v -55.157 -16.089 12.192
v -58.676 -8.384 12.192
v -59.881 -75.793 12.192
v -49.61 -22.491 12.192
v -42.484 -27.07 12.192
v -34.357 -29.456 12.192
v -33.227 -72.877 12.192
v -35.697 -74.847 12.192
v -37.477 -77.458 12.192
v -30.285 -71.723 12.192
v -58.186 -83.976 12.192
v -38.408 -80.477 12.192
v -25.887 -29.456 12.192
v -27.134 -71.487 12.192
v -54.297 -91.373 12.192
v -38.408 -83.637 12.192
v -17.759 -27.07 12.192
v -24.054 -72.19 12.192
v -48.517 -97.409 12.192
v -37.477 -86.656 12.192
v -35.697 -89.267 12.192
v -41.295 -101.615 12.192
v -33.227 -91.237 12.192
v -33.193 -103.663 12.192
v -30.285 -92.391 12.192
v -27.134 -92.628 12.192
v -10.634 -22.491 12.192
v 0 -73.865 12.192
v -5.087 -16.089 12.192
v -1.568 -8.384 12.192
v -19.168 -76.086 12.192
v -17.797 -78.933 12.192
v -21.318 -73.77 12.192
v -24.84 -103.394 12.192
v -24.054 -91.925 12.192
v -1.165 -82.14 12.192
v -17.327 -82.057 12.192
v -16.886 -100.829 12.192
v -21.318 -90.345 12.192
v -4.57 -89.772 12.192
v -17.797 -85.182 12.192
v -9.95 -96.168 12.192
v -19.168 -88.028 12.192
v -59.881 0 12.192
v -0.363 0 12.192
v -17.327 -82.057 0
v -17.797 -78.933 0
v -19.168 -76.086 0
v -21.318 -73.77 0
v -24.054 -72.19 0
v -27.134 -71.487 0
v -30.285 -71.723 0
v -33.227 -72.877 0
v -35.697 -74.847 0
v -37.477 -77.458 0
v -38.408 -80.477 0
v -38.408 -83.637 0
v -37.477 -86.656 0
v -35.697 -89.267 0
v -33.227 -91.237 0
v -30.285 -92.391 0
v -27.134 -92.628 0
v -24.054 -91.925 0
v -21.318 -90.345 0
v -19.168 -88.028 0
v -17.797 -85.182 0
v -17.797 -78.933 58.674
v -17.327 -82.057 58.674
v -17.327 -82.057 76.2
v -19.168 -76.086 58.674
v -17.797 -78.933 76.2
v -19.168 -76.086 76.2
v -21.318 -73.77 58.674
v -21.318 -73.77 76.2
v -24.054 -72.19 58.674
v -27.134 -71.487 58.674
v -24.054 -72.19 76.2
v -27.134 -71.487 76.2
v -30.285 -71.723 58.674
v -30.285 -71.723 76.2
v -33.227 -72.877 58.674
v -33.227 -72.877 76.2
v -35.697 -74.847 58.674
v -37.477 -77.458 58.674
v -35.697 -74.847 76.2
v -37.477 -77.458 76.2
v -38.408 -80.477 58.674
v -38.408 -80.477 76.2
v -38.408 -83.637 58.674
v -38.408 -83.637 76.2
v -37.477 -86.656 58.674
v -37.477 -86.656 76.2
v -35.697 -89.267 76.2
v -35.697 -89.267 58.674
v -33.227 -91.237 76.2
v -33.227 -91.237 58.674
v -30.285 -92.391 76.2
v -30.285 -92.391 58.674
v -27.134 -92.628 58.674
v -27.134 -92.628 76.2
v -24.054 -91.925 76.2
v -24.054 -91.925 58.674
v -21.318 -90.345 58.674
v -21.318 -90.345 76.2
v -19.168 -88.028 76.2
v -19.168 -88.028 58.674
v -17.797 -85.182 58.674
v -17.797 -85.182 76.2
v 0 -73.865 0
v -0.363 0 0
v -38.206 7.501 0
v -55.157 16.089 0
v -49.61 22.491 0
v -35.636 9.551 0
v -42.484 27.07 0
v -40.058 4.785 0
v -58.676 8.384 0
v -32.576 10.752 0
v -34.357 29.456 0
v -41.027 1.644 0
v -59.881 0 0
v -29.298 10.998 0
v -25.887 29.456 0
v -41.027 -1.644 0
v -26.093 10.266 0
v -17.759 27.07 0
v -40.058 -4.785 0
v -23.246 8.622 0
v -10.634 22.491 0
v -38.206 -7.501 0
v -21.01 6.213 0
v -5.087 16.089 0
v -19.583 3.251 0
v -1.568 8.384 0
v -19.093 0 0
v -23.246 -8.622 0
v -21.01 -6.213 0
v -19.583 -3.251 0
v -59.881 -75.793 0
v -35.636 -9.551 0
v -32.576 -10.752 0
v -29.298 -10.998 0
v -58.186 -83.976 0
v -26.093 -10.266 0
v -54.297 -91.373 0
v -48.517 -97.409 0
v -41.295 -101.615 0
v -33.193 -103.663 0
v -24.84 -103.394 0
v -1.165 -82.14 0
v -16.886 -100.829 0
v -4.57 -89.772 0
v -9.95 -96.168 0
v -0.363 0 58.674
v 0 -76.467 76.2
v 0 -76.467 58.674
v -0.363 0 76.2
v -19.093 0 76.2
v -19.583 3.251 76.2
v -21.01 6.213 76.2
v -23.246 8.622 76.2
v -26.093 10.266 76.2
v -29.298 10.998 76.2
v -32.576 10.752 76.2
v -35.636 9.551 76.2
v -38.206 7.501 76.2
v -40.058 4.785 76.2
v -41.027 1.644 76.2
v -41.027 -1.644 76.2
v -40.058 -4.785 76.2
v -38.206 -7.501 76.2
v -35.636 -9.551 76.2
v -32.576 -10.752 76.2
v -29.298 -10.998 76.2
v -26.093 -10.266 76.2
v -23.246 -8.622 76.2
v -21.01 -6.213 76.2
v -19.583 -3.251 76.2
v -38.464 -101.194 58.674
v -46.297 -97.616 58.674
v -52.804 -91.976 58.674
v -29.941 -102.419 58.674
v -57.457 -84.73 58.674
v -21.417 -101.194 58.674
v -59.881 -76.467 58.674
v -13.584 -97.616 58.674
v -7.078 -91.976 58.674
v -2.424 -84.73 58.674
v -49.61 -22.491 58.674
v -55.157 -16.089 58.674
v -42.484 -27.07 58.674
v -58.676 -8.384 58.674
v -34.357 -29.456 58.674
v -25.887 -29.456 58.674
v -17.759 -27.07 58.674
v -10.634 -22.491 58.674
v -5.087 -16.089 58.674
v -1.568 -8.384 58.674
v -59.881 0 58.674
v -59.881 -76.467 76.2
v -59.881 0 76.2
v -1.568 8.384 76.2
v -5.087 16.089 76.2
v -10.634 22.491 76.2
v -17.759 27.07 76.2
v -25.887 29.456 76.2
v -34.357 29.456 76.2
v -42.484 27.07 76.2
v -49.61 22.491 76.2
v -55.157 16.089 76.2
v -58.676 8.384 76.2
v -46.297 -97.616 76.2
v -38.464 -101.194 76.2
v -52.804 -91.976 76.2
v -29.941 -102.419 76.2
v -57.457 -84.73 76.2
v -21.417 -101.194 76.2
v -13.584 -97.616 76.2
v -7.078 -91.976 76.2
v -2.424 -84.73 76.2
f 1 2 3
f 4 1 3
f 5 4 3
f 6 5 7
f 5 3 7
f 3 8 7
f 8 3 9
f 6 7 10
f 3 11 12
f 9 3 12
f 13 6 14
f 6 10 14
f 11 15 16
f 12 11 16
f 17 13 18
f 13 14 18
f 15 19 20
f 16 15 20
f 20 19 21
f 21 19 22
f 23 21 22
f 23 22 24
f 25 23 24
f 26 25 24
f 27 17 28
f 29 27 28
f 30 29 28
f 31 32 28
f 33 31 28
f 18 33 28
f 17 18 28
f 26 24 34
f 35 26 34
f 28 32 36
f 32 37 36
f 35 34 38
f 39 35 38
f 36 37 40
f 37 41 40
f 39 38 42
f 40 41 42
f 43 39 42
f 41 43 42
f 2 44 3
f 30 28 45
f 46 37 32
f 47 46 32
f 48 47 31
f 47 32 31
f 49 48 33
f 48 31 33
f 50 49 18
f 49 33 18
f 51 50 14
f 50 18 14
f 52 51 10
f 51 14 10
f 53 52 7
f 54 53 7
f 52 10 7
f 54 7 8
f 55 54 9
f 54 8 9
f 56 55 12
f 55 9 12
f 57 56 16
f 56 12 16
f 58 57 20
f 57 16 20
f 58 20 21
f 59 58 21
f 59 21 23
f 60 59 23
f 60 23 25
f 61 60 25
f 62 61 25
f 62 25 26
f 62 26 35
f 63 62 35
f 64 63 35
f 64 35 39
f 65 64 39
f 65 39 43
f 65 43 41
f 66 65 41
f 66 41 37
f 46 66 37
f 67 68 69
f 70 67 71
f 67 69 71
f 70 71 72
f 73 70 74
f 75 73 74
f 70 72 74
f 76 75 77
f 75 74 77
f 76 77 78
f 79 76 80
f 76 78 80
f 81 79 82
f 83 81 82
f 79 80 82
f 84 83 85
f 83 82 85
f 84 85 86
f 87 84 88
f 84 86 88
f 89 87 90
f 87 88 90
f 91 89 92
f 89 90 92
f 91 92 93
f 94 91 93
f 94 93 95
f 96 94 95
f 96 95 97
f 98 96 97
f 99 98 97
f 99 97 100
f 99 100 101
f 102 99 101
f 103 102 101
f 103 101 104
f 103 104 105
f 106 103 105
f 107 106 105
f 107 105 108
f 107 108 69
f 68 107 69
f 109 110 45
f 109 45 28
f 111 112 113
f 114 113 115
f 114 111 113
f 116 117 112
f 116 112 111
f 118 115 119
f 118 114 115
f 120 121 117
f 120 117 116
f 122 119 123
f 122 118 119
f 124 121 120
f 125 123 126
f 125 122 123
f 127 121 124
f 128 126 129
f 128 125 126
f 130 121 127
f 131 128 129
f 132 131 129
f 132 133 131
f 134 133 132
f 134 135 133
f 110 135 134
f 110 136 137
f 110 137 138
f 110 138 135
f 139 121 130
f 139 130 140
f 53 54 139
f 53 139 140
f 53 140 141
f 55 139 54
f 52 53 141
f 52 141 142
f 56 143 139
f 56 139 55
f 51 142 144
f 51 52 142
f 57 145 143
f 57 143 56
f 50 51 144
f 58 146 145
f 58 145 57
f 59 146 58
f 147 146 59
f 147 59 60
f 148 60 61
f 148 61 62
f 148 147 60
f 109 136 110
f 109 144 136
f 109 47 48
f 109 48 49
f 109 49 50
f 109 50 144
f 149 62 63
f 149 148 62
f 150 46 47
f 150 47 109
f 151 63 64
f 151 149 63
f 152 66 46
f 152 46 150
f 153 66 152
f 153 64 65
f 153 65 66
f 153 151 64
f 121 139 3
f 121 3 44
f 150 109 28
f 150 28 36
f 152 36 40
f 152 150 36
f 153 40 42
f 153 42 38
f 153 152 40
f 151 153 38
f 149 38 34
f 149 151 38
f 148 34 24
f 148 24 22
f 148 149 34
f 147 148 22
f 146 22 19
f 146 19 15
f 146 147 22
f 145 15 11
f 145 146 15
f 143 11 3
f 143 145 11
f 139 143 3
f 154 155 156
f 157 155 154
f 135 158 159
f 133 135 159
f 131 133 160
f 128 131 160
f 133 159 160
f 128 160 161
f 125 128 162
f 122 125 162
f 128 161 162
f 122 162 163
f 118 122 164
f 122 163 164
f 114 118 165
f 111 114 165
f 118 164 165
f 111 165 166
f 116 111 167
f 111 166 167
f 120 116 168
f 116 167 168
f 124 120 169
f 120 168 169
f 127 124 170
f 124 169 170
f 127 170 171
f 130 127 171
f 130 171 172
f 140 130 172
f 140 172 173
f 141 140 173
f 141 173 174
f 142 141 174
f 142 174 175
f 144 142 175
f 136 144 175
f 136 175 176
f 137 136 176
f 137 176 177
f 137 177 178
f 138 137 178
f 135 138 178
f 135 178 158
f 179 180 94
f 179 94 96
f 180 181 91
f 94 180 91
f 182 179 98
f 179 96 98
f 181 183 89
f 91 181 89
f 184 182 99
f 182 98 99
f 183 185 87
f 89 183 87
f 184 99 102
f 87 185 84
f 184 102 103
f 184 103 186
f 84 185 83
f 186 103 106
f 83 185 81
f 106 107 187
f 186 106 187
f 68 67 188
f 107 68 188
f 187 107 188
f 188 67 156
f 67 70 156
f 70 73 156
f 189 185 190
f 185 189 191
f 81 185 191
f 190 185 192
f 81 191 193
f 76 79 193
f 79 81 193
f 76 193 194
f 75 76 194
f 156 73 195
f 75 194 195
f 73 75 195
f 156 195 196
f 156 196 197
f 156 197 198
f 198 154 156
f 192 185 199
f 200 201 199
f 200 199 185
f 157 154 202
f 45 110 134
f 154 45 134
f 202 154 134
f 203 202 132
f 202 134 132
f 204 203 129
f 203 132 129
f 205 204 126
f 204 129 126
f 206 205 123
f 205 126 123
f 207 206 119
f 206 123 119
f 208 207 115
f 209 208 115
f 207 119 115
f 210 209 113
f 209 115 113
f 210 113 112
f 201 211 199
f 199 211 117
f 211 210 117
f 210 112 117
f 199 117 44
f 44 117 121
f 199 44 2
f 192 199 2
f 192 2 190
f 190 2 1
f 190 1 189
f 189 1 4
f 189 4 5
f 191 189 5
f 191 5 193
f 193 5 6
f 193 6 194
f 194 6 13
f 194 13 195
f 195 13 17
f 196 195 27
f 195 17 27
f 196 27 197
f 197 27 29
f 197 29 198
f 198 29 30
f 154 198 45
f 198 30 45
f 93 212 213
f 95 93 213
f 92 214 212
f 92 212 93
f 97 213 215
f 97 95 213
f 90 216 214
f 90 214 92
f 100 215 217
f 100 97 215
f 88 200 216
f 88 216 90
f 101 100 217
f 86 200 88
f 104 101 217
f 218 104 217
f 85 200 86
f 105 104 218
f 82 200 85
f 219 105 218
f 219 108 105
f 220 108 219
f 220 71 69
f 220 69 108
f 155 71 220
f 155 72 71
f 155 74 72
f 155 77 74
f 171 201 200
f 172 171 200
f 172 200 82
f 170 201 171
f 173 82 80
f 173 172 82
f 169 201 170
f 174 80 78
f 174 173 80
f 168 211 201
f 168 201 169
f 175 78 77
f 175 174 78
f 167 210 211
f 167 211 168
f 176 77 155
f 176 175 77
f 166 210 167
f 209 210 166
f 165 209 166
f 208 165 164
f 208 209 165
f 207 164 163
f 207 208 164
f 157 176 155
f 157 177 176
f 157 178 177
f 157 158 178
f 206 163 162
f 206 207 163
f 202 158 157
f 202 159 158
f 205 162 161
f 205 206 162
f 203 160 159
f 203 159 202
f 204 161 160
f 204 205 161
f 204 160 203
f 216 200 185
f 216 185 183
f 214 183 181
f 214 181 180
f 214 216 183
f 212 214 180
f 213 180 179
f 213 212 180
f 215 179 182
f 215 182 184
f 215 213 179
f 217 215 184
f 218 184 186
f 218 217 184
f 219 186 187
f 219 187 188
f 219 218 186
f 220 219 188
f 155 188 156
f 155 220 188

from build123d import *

# Parameters (mm, degrees)
F0_R     = 29.759275958
F1_DEPTH = 76.2
F2_R     = 11.0284850213
F3_DEPTH = 120.142
F5_DEPTH = 12.192
F7_DEPTH = 17.526
F8_R     = 10.6000065129
F9_DEPTH = 148.59


with BuildPart() as f1:
    # F0 (on Top) → F1 (new body)
    with BuildSketch(Plane.XY):
        with Locations((-30.121833086, 0)):
            Circle(F0_R)
    extrude(amount=F1_DEPTH)

    # F2 (on face) → F3 (cut)
    with BuildSketch(Plane.XY.offset(76.2)):
        with Locations((-30.121833086, 0)):
            Circle(F2_R)
    extrude(amount=-F3_DEPTH, mode=Mode.SUBTRACT)

    # F4 (on face) → F5 (join)
    with BuildSketch(Plane(origin=(0, 0, 0), x_dir=(1, 0, 0), z_dir=(0, 0, -1))):
        with BuildLine():
            Line((-59.8811090441, 75.7926106453), (-59.8811090441, 0))
            ThreePointArc((-59.8811090441, 0), (-30.121833086, 29.759275958), (-0.362557128, 0))
            Line((-0.362557128, 0), (0, 73.8646537066))
            ThreePointArc((0, 73.8646537066), (-29.0071131969, 103.8207225337), (-59.8811090441, 75.7926106453))
        make_face()
    extrude(amount=-F5_DEPTH)

    # F6 (on face) → F7 (join)
    with BuildSketch(Plane.XY.offset(76.2)):
        with BuildLine():
            Line((0, -76.4673426747), (-0.362557128, 0))
            ThreePointArc((-0.362557128, 0), (-30.121833086, -29.759275958), (-59.8811090441, 0))
            Line((-59.8811090441, 0), (-59.8811090441, -76.4673426747))
            ThreePointArc((-59.8811090441, -76.4673426747), (-29.940554522, -102.4194670942), (0, -76.4673426747))
        make_face()
    extrude(amount=-F7_DEPTH)

    # F8 (on face) → F9 (cut)
    with BuildSketch(Plane.XY.offset(76.2)):
        with Locations((-27.9265381396, -82.0572450757)):
            Circle(F8_R)
    extrude(amount=-F9_DEPTH, mode=Mode.SUBTRACT)


solid = f1.part
